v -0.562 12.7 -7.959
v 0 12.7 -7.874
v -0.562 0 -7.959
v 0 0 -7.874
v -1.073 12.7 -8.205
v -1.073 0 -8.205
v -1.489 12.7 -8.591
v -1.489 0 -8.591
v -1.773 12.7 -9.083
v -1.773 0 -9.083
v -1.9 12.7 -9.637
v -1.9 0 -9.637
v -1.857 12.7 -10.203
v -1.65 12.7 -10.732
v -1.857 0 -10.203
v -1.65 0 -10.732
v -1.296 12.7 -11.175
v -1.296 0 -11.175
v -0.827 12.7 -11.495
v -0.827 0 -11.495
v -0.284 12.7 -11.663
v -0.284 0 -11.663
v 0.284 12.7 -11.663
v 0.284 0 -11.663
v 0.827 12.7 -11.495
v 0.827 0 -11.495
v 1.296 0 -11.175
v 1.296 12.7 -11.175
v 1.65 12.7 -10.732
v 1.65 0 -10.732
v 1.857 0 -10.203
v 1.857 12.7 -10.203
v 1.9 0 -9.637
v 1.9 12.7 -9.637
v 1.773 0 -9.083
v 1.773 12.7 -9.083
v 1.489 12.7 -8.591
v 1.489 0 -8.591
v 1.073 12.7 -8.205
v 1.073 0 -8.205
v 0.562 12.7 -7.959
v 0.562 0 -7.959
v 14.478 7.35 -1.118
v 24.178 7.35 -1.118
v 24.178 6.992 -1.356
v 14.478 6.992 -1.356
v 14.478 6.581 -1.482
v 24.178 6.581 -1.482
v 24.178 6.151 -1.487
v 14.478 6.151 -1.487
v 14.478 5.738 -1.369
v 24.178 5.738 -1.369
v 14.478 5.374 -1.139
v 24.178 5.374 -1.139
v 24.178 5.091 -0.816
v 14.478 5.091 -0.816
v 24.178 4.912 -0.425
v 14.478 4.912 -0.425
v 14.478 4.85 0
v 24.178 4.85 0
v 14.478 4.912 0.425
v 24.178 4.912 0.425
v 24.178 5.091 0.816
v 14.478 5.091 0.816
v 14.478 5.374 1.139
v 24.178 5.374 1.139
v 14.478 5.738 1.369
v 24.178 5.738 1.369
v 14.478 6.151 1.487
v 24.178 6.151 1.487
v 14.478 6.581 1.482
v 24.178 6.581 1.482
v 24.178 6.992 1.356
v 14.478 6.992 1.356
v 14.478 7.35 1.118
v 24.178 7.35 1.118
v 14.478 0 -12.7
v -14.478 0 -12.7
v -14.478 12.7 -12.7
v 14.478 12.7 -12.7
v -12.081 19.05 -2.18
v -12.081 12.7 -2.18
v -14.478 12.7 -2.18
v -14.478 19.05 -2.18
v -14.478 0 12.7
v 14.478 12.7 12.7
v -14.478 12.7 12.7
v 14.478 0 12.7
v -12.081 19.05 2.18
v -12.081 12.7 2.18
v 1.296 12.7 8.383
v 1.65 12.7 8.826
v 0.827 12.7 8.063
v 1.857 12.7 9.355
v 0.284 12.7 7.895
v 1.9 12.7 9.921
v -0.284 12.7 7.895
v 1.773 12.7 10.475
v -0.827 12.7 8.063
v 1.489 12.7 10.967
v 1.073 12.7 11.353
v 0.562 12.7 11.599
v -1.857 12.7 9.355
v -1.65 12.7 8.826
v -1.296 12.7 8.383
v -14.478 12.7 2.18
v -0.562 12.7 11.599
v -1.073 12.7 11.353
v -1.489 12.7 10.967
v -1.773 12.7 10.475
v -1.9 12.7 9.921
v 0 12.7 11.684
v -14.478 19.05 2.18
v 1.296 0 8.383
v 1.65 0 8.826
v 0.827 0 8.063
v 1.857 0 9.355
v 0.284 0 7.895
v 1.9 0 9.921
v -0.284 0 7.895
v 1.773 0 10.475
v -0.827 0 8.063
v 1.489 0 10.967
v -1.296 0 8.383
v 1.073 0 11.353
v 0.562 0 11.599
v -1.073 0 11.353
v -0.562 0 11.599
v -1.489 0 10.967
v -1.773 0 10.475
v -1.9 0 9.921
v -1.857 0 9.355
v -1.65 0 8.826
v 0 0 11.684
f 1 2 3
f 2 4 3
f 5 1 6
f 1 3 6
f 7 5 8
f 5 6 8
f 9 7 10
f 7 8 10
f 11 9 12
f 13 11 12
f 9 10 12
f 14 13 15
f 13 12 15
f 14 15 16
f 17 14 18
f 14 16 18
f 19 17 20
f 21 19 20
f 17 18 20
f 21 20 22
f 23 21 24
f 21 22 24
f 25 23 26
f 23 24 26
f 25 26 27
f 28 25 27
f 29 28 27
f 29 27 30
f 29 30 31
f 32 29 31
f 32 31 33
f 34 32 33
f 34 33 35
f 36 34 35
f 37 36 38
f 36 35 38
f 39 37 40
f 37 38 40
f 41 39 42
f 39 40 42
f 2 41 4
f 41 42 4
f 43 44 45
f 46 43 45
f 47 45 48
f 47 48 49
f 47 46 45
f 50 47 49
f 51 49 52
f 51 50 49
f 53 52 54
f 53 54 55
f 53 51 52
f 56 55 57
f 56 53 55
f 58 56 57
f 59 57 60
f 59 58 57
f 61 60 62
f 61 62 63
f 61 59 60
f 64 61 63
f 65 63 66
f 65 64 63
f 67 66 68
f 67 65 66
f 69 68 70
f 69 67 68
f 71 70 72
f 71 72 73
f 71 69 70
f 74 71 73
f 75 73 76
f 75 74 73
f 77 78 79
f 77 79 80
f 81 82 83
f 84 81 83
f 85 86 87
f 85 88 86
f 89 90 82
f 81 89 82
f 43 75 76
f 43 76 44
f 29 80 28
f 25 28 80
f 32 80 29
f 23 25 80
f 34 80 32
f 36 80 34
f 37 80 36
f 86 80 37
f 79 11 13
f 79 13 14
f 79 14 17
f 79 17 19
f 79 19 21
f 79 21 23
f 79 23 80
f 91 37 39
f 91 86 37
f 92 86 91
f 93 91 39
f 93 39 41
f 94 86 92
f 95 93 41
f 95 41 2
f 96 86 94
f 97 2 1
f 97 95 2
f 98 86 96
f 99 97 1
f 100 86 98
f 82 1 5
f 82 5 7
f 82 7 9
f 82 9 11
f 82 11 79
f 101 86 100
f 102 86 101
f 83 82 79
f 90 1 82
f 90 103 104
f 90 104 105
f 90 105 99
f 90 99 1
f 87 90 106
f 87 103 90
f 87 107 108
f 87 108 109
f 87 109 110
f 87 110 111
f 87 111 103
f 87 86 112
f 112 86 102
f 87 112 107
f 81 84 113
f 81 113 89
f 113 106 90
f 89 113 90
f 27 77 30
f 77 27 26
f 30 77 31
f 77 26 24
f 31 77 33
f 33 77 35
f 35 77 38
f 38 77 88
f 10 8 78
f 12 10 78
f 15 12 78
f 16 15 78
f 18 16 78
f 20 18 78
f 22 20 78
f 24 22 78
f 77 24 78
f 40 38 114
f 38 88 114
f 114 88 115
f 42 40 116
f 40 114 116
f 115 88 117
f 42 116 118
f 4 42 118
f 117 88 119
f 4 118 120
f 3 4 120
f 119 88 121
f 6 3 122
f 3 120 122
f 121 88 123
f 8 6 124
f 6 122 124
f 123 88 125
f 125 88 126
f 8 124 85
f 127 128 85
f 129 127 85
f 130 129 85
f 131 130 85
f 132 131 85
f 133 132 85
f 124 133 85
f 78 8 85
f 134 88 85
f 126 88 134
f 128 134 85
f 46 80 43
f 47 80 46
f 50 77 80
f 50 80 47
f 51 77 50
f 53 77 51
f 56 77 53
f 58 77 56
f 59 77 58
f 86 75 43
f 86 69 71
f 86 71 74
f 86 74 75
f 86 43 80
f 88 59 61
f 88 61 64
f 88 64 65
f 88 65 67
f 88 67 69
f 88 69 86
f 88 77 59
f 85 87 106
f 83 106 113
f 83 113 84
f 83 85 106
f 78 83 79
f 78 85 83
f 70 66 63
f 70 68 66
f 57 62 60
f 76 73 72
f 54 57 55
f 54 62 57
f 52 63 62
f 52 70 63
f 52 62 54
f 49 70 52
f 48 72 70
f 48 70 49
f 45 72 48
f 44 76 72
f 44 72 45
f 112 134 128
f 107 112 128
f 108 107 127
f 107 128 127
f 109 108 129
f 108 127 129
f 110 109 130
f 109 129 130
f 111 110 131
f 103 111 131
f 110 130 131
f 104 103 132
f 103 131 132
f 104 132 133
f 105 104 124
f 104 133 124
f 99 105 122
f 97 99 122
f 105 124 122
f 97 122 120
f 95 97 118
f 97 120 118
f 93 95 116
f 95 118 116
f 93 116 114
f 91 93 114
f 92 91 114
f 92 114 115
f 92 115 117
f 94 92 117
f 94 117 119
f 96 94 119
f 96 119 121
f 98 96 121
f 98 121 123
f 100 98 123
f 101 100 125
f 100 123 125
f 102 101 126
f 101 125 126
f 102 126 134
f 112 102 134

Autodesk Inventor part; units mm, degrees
ref_plane "YZ Plane" through (0, 0, 0) normal (1, 0, 0) x (0, 1, 0)
ref_plane "XZ Plane" through (0, 0, 0) normal (0, 1, 0) x (-1, 0, 0)
ref_plane "XY Plane" through (0, 0, 0) normal (0, 0, 1) x (1, 0, 0)
sketch "Sketch1" plane through (0, 0, 0) normal (0, 1, 0) x (-1, 0, 0)
  line L0 (-14.478, 12.7) -> (14.478, 12.7)
  line L1 (14.478, 12.7) -> (14.478, -12.7)
  line L2 (14.478, -12.7) -> (-14.478, -12.7)
  line L3 (-14.478, -12.7) -> (-14.478, 12.7)
  line L4 (-14.478, 12.7) -> (14.478, -12.7) construction
  line L5 (14.478, 12.7) -> (-14.478, -12.7) construction
  point P0 (0, 0)
  dimension "d0" = 28.956
  dimension "d1" = 25.4
extrude "Extrusion1" add sketch "Sketch1" along normal blind 12.7
sketch "Sketch2" plane through (0, 12.7, 0) normal (0, 1, 0) x (1, 0, 0)
  point P0 (0, 0)
  point P1 (0, -9.779)
  point P2 (0, 9.779)
  dimension "d4" = 9.779
  dimension "d5" = 19.558
hole "Hole1" at (0, 12.7, 9.779) at (0, 12.7, -9.779) direction (0, -1, 0) diameter 3.81 end through all clearance for "Flat Head Machine Screw (82)" size "#6" standard "Ansi Unified Screw Threads"
sketch "Sketch3" plane through (14.478, 0, 12.7) normal (1, 0, 0) x (0, 0, -1)
  circle A0 centre (12.7, 6.35) radius 1.5
  line L0 (25.4, 0) -> (0, 0) projected
  line L1 (0, 12.7) -> (25.4, 12.7) projected
  line L2 (11.582, 7.35) -> (13.818, 7.35)
  point P0 (12.7, 0)
  point P1 (12.7, 0)
  dimension "d13" = 3
  dimension "d14" = 6.35
  dimension "d15" = 12.7
  dimension "d18" = 1
extrude "Extrusion3" add sketch "Sketch3" along normal blind 9.7 contours A0 L2 picked at (12.7594, 6.5202)
sketch "Sketch4" plane through (0, 12.7, 0) normal (0, 1, 0) x (1, 0, 0)
  line L0 (-14.478, -2.1797) -> (-12.0814, -2.1797)
  line L1 (-12.0814, -2.1797) -> (-12.0814, 2.1797)
  line L2 (-12.0814, 2.1797) -> (-14.478, 2.1797)
  line L3 (-14.478, 2.1797) -> (-14.478, -2.1797)
  line L4 (-14.478, -2.1797) -> (-12.0814, 2.1797) construction
  line L5 (-12.0814, -2.1797) -> (-14.478, 2.1797) construction
  line L6 (-14.478, 12.7) -> (-14.478, -12.7) projected
  point P0 (0, 0)
  point P1 (-13.2797, 0)
  point P2 (-13.2797, 0)
extrude "Extrusion4" add sketch "Sketch4" along normal blind 6.35
equation "\"d14\" = 0.5 * d15"
properties part number "MotorWithEnclosure" material "ABS Plastic"
